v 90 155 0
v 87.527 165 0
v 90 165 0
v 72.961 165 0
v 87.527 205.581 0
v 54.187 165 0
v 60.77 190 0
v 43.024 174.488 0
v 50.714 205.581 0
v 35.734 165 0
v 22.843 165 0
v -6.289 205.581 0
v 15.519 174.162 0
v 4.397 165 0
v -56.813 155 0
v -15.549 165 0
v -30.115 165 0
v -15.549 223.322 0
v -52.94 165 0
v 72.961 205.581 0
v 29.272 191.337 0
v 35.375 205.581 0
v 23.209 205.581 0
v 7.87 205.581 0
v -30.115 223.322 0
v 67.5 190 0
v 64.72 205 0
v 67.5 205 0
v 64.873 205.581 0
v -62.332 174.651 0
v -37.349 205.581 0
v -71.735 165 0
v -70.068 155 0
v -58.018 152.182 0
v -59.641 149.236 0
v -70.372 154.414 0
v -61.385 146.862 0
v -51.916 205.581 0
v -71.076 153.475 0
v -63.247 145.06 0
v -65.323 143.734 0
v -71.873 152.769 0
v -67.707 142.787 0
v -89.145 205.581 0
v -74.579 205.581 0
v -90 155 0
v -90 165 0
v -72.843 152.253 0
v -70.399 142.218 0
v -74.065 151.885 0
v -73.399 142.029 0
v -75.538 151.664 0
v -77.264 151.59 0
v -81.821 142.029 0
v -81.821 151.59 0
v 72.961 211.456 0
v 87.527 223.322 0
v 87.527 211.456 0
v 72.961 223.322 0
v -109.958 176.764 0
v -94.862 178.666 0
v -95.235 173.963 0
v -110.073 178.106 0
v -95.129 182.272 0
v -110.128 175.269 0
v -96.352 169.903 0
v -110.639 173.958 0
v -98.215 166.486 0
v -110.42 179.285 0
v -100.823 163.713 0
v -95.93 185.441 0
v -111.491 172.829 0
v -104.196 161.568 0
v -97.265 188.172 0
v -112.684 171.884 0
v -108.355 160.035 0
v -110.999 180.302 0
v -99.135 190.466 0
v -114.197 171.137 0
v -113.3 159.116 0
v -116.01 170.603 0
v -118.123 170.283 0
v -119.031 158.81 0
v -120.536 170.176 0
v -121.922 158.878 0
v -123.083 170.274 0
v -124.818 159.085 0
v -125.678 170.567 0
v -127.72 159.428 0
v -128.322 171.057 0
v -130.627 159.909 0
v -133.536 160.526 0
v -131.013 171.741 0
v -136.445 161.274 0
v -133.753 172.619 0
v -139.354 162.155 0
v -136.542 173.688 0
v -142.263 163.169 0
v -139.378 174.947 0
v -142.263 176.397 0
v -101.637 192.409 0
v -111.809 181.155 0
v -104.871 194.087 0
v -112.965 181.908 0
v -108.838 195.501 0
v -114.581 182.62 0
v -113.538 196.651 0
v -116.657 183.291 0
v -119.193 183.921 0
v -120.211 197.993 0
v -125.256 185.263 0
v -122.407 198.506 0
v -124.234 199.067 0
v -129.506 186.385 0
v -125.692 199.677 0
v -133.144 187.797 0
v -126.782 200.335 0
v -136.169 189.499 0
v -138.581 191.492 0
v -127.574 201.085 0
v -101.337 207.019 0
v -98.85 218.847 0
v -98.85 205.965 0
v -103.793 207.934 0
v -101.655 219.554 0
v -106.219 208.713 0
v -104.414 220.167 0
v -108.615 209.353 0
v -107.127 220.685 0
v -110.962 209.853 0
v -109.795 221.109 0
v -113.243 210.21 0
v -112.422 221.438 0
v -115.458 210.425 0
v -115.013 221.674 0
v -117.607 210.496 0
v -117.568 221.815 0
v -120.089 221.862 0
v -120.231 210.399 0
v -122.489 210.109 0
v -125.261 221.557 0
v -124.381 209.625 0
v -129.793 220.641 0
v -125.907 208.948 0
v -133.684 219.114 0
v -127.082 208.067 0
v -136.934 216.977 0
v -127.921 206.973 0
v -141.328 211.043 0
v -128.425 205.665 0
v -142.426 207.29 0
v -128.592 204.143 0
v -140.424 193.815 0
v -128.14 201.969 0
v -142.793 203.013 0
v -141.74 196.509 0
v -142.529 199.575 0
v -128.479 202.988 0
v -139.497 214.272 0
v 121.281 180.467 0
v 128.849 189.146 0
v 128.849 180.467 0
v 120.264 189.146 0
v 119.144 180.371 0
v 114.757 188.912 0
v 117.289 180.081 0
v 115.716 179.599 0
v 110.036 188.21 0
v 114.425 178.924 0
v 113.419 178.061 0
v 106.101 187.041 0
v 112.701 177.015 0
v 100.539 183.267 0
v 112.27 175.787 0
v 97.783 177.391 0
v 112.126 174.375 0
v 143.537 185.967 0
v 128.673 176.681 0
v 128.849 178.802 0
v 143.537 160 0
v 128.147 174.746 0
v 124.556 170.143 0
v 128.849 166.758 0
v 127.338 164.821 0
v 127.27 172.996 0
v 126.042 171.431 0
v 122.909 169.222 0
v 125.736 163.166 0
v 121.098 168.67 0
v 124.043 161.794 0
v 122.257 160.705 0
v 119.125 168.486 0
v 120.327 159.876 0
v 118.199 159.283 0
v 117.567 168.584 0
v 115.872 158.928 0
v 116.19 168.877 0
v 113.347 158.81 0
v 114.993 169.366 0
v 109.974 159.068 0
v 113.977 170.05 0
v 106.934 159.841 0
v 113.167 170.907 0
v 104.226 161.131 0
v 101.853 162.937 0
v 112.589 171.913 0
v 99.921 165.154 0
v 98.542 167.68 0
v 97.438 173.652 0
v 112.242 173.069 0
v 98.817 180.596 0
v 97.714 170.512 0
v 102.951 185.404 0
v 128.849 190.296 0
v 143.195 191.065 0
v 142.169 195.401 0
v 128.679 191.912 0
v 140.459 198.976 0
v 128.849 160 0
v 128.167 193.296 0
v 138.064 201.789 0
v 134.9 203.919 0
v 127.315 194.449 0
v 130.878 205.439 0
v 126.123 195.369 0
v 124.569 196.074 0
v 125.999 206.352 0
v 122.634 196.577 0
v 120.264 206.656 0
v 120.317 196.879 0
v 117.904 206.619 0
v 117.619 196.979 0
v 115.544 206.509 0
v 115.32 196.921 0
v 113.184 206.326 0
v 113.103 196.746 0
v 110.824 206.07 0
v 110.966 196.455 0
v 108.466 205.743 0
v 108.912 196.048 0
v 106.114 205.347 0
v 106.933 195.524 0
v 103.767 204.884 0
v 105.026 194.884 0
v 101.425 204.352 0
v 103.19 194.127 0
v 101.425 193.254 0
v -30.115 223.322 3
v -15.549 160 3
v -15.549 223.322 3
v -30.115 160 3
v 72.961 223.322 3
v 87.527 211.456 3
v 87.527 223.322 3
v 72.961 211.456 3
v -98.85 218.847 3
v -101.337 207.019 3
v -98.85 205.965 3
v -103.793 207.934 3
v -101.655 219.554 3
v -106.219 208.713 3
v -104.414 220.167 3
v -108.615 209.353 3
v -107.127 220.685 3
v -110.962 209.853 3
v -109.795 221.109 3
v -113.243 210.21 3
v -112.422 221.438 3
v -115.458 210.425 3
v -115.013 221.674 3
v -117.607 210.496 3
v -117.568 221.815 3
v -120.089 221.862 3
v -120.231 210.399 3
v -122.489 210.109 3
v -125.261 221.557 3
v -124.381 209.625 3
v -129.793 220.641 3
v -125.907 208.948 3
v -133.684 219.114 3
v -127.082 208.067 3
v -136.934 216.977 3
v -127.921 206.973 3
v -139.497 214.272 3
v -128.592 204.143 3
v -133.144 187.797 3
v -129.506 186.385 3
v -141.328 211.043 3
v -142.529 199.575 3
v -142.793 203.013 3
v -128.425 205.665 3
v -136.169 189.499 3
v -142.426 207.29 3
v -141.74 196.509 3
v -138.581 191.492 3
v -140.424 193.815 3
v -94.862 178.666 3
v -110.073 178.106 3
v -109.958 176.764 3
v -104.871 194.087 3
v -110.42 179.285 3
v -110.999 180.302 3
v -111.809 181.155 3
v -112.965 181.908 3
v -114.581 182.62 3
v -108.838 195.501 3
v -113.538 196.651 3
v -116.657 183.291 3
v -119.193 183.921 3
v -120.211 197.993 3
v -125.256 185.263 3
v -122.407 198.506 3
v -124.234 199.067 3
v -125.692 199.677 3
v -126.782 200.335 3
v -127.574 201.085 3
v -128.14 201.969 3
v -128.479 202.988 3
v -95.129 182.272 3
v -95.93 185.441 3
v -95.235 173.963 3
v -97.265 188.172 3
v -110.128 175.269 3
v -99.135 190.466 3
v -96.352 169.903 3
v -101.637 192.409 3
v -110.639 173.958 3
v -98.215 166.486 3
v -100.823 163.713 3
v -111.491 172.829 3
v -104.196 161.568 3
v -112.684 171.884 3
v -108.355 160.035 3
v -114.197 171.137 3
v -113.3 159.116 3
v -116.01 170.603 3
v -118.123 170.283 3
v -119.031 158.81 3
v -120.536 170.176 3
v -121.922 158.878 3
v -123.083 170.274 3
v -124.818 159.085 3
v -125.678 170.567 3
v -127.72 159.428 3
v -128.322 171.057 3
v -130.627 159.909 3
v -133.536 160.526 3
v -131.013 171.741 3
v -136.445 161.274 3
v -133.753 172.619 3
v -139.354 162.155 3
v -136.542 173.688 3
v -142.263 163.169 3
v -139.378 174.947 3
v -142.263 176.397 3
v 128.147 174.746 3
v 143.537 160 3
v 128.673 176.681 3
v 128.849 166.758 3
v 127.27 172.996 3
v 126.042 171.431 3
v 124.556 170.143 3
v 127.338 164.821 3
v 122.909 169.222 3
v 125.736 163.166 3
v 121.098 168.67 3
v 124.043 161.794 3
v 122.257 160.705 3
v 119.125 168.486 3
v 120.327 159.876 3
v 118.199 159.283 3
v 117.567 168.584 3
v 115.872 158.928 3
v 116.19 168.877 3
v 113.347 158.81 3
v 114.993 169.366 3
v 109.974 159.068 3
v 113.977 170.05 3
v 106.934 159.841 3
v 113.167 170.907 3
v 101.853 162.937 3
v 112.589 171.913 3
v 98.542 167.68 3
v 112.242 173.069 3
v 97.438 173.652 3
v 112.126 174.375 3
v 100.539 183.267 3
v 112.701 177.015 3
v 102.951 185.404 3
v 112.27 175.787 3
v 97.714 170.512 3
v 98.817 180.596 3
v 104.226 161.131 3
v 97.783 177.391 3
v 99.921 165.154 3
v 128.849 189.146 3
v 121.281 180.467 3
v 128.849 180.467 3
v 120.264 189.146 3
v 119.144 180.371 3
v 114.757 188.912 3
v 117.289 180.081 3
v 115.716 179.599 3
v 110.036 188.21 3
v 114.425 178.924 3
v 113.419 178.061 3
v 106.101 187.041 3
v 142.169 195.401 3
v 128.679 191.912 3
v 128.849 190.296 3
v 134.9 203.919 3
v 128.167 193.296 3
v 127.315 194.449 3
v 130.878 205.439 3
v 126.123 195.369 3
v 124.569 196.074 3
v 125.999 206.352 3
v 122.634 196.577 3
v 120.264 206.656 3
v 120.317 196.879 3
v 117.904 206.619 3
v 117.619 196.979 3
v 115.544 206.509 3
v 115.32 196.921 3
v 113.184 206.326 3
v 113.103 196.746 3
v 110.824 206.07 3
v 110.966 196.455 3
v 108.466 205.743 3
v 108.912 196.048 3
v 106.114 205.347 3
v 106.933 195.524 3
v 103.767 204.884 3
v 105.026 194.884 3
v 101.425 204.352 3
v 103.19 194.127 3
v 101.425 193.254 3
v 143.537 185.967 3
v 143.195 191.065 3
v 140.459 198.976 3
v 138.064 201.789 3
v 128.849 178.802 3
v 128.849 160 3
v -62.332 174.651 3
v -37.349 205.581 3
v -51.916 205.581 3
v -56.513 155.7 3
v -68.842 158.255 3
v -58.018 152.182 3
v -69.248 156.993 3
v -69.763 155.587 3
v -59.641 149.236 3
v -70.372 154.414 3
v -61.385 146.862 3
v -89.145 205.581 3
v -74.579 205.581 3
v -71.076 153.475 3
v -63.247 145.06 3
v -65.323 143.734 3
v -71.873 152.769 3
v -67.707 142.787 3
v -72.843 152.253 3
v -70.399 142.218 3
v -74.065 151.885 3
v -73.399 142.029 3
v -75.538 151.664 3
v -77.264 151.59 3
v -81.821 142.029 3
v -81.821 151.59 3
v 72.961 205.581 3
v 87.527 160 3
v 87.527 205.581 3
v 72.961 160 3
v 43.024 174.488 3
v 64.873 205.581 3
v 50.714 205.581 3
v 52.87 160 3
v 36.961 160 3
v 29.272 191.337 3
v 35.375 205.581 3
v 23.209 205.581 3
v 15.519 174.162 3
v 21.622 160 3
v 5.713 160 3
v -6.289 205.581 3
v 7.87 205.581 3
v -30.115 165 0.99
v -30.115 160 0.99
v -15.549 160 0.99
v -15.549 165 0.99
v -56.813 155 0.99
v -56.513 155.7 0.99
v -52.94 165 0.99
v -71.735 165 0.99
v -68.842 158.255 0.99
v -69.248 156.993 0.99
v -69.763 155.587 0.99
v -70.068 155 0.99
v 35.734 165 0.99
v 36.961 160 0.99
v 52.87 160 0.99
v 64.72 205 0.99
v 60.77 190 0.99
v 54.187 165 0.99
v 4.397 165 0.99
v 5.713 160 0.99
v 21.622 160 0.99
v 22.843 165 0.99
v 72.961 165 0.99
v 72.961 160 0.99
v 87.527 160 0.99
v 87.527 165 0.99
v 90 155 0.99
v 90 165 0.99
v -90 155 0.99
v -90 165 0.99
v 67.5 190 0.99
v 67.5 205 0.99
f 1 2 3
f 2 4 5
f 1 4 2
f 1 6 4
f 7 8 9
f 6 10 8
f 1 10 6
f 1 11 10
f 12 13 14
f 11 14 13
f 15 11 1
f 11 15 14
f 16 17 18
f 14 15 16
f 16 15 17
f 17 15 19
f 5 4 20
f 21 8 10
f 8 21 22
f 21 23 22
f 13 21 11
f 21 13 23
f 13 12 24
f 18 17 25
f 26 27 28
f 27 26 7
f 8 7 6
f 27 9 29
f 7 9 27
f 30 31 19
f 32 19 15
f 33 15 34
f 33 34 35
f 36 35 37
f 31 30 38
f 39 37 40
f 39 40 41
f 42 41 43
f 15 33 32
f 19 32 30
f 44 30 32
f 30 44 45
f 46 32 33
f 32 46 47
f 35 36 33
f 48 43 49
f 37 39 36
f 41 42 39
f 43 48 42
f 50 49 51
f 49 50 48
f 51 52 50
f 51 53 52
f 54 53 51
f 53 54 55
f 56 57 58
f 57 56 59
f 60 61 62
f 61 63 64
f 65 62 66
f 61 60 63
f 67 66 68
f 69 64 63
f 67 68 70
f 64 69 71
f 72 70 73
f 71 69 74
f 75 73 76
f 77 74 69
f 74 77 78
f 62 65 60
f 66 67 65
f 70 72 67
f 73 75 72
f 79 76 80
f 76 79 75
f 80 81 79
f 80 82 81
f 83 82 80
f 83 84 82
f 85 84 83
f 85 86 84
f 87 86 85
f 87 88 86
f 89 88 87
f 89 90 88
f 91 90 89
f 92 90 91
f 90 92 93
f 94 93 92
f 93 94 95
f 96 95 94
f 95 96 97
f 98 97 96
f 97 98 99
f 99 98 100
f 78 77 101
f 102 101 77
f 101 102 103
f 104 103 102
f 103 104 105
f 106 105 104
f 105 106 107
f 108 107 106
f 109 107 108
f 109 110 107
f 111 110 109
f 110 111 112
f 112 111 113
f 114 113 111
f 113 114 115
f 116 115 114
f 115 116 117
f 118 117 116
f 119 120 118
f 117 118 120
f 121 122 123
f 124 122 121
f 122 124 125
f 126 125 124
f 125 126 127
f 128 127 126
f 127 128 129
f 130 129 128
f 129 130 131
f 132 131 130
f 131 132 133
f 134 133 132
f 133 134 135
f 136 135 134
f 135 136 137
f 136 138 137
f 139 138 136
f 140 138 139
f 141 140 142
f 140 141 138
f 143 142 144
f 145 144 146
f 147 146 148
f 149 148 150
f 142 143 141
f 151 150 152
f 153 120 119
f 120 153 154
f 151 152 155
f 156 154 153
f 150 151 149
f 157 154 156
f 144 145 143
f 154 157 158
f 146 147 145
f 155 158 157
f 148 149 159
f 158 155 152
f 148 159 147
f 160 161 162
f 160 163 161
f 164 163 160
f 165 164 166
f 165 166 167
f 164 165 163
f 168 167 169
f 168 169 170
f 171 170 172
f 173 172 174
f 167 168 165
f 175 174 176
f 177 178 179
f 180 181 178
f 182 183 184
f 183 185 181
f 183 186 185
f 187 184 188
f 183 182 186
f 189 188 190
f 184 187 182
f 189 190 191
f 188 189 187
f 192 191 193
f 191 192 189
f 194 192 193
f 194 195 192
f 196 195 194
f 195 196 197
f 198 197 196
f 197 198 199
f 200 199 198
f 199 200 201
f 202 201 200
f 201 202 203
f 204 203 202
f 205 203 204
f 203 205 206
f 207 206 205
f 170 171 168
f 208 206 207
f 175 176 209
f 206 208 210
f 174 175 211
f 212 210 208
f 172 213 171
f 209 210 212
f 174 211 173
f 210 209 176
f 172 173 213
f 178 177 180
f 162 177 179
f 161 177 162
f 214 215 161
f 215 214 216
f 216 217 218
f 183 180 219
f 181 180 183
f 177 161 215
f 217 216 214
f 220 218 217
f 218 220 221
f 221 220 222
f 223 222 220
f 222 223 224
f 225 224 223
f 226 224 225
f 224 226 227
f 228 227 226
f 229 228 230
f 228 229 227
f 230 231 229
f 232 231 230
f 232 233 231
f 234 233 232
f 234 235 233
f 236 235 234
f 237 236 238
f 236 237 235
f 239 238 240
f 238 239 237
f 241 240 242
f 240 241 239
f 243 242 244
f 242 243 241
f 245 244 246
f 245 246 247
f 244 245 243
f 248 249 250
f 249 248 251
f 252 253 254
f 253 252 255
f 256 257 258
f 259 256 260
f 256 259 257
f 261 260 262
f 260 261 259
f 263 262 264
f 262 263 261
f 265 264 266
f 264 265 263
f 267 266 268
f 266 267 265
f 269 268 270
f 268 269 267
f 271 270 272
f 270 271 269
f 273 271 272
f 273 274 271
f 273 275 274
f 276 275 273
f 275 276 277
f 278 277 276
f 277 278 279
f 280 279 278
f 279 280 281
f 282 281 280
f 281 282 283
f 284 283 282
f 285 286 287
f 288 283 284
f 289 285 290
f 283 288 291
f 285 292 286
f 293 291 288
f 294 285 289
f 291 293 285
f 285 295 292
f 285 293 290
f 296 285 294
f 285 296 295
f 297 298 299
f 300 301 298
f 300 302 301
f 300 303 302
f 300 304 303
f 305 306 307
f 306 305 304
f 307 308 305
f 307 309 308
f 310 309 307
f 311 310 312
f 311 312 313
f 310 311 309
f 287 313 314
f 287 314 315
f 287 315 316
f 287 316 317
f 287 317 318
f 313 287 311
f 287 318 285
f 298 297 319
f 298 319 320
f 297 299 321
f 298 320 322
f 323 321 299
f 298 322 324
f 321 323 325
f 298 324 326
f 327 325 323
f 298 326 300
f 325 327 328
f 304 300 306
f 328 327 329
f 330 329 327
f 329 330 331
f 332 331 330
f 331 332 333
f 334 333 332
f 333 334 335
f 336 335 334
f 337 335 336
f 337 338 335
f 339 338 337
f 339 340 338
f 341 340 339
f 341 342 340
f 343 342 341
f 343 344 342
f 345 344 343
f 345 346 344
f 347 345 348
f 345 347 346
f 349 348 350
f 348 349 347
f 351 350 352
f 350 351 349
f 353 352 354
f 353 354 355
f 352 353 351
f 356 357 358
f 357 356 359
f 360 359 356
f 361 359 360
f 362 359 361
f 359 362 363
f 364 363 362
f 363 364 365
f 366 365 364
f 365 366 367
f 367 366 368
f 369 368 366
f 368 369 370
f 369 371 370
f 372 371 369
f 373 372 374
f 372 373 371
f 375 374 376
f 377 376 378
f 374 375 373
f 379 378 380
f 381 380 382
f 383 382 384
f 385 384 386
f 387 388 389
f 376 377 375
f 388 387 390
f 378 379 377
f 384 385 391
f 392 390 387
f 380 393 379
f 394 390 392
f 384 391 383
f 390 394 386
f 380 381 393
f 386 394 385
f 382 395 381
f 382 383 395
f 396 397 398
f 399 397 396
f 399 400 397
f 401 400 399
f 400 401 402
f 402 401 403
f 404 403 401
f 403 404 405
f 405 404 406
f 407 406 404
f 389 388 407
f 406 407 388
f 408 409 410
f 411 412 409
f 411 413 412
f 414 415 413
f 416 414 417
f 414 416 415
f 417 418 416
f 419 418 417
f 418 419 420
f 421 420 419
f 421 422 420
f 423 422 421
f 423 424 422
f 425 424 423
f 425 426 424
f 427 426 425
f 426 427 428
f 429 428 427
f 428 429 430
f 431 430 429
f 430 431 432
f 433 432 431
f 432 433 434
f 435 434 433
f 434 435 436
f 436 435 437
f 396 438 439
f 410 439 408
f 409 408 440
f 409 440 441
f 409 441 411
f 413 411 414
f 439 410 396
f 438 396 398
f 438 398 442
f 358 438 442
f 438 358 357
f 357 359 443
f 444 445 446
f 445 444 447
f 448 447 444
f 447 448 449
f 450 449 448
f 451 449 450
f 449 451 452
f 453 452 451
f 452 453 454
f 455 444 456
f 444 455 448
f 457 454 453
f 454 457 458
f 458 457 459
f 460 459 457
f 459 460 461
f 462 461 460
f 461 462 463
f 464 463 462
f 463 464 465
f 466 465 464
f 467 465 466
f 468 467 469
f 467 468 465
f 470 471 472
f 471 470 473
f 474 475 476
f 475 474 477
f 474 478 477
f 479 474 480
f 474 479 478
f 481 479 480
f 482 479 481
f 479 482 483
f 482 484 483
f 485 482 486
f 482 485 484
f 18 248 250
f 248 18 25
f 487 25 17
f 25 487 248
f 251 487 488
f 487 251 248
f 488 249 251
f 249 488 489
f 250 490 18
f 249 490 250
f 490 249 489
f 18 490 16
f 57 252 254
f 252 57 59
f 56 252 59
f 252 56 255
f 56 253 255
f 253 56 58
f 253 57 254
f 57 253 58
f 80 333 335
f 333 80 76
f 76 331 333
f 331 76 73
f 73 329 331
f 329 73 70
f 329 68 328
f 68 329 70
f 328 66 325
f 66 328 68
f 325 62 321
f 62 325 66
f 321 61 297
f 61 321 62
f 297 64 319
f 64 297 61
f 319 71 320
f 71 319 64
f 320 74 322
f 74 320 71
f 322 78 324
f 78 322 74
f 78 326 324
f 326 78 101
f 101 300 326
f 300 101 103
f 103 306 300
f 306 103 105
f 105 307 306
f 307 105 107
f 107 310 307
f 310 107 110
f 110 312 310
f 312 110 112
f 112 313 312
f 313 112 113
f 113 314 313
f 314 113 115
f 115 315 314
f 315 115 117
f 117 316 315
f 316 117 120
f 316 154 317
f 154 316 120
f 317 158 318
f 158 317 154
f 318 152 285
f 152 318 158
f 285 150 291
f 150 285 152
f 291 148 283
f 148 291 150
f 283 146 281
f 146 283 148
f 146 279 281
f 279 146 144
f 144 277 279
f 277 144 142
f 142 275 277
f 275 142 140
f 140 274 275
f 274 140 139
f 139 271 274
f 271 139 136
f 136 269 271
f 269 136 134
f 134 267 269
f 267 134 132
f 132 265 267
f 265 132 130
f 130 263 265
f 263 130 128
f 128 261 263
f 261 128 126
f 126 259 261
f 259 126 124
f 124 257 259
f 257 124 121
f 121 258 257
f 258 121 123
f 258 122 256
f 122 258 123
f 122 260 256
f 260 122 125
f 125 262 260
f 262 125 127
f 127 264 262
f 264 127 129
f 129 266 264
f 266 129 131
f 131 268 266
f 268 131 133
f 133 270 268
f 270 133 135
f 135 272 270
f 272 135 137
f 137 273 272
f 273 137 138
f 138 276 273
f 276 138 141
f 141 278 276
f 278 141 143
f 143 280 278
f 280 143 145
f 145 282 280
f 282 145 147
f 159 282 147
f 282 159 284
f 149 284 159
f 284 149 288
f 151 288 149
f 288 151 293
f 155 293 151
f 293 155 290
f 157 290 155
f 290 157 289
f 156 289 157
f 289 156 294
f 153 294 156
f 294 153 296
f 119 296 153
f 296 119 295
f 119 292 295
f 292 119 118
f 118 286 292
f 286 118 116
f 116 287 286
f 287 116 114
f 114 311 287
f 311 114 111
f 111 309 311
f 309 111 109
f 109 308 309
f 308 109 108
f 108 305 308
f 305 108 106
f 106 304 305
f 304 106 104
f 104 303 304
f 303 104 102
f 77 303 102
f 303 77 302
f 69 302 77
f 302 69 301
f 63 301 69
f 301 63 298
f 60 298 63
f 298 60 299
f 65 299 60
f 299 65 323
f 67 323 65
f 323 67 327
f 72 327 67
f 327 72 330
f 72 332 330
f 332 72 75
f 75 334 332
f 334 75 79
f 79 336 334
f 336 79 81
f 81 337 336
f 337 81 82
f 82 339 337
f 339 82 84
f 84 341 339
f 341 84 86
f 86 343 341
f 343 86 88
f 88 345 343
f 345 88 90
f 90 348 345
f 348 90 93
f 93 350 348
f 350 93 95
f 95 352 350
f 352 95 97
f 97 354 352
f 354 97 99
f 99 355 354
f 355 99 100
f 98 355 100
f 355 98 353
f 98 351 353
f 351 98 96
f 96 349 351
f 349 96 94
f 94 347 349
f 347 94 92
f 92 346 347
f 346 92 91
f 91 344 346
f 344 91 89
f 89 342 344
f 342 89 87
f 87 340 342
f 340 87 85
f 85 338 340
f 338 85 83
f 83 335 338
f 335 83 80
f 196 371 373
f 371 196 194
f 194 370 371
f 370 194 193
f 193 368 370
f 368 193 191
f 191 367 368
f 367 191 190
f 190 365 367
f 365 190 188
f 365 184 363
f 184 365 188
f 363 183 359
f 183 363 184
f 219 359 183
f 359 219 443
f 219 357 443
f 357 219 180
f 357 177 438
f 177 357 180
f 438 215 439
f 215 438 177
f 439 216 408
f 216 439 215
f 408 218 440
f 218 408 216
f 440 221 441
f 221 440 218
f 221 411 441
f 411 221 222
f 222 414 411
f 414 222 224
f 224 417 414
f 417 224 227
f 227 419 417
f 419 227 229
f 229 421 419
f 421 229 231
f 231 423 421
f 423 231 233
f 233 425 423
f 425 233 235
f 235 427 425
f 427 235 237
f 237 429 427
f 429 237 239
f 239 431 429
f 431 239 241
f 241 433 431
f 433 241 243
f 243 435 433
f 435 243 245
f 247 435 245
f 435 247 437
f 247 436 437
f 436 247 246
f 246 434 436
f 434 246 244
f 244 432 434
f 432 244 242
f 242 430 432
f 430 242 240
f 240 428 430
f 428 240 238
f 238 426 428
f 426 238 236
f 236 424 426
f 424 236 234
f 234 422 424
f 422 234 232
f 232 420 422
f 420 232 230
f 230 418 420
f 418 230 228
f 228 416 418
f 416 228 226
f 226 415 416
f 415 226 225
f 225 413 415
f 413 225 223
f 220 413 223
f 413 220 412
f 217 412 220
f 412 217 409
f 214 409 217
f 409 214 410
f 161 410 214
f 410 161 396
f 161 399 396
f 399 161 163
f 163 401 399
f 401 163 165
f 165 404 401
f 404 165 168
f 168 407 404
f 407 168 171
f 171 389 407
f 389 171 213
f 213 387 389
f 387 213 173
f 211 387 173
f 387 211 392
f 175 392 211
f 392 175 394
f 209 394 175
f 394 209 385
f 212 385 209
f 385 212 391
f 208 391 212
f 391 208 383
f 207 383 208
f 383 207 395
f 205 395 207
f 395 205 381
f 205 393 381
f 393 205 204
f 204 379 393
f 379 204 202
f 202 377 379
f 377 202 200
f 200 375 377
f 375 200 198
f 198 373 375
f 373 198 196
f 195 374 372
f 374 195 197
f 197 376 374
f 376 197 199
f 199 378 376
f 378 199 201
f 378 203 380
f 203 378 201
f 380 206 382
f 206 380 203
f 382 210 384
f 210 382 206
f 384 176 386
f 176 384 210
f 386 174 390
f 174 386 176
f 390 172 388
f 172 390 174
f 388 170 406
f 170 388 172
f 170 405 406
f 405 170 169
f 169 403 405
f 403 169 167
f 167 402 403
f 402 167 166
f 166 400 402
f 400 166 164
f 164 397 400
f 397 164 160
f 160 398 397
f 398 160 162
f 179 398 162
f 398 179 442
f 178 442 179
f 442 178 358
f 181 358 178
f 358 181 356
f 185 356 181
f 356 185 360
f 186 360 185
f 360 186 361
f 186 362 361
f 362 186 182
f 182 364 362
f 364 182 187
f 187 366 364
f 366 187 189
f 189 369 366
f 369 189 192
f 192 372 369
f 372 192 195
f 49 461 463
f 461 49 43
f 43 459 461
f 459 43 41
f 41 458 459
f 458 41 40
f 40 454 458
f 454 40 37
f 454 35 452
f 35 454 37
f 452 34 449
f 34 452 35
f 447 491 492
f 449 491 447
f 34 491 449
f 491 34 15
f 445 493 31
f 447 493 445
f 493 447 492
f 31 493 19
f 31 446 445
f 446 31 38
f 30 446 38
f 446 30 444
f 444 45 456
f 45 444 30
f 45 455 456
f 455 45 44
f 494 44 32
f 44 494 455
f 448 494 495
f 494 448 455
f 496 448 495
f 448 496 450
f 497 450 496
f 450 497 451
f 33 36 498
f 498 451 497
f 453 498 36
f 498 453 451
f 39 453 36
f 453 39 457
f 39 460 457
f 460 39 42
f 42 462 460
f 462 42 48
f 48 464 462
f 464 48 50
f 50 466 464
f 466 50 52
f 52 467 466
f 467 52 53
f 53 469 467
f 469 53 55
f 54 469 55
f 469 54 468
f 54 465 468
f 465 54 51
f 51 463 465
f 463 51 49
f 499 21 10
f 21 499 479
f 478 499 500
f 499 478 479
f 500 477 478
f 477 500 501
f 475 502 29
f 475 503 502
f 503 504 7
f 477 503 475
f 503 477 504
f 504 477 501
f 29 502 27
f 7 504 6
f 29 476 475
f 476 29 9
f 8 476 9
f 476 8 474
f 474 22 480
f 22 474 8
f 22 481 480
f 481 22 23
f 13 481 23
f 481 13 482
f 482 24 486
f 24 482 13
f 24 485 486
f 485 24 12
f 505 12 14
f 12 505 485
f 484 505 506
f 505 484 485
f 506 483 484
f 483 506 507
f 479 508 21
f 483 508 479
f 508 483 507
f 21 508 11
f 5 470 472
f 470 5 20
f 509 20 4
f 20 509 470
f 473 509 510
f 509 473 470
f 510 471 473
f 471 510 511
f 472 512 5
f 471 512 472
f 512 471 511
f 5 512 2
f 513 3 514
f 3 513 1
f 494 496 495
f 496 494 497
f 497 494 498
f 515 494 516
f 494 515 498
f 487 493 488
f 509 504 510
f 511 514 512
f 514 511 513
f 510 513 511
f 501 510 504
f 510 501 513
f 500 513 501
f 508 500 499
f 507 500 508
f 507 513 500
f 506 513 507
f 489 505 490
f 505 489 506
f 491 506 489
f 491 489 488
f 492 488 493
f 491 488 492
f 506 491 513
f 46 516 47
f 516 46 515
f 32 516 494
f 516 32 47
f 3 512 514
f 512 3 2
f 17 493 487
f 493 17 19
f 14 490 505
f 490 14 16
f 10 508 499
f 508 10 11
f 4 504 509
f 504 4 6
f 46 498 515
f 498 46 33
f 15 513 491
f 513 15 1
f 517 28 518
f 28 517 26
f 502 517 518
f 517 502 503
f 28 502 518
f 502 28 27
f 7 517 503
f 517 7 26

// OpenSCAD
//font="Bitstream Vera Sans:style=Bold";
//font="Titan One";
font="Baskerville:style=Bold";
text_on_flat="Sylwia & Lali";
text_on_flat2="ali";
text_on_flat3="L";
text4="Sylwia";
text5="&";

text_size=40;
depth=3;
spacing=1;

frame_z_offset = 0.5*text_size;

frame_width=10;
frame_depth=20;
frame_cover_overlap=frame_width*0.8;
picture_overlap=frame_width-frame_cover_overlap;

picture_x=100;
picture_z=150;
picture_depth=0.5*frame_depth;

cover_spacing=0.4;
cover_wall_width=0.8;
cover_depth_multiplier=0.8;

module the_bar(length) {
  bar_depth = 0.33*depth;
  translate([0, 0, 0.5*bar_depth]) cube([length, 0.25*text_size, bar_depth], center=true);
}


module the_text(text, size) {
linear_extrude(height=depth, convexity=4)
    text(text, 
         size=size,
         font=font,
         halign="center",
         spacing=spacing);
}

module the_text_with_bar(text, size, length) {
linear_extrude(height=depth, convexity=4)
    text(text, 
         size=size,
         font=font,
         halign="center",
         spacing=spacing);
  the_bar(length);
}

module ibar(width, length) {
  cube([width, length, 0.33*depth]);
}



//the_text_with_bar(text_on_flat, 60, 430);
//translate([-54.5, 30, 0]) ibar(10,15);
//translate([208, 30, 0]) ibar(10,15);


//translate([-70, 0, 0]) the_text_with_bar(text_on_flat3, 80, 55);
//the_text_with_bar(text_on_flat2, 60, 85);
//translate([28, 30, 0]) ibar(10,15);

//translate([0, 80, 0]) the_text_with_bar(text5, 60, 0);

translate([0, 160, 0]) {
the_text_with_bar(text4, 60, 180);
translate([57.5, 30, 0]) ibar(10,15);
}

//translate([0, -50, 0]) the_text_with_bar(text_on_flat2, 30, 110);
//the_frame();
//cover();

//translate([48.3, -29.5, 0]) ibar(7.35,7);
//translate([-23.8, -29.5, 0]) ibar(7.35,7);
